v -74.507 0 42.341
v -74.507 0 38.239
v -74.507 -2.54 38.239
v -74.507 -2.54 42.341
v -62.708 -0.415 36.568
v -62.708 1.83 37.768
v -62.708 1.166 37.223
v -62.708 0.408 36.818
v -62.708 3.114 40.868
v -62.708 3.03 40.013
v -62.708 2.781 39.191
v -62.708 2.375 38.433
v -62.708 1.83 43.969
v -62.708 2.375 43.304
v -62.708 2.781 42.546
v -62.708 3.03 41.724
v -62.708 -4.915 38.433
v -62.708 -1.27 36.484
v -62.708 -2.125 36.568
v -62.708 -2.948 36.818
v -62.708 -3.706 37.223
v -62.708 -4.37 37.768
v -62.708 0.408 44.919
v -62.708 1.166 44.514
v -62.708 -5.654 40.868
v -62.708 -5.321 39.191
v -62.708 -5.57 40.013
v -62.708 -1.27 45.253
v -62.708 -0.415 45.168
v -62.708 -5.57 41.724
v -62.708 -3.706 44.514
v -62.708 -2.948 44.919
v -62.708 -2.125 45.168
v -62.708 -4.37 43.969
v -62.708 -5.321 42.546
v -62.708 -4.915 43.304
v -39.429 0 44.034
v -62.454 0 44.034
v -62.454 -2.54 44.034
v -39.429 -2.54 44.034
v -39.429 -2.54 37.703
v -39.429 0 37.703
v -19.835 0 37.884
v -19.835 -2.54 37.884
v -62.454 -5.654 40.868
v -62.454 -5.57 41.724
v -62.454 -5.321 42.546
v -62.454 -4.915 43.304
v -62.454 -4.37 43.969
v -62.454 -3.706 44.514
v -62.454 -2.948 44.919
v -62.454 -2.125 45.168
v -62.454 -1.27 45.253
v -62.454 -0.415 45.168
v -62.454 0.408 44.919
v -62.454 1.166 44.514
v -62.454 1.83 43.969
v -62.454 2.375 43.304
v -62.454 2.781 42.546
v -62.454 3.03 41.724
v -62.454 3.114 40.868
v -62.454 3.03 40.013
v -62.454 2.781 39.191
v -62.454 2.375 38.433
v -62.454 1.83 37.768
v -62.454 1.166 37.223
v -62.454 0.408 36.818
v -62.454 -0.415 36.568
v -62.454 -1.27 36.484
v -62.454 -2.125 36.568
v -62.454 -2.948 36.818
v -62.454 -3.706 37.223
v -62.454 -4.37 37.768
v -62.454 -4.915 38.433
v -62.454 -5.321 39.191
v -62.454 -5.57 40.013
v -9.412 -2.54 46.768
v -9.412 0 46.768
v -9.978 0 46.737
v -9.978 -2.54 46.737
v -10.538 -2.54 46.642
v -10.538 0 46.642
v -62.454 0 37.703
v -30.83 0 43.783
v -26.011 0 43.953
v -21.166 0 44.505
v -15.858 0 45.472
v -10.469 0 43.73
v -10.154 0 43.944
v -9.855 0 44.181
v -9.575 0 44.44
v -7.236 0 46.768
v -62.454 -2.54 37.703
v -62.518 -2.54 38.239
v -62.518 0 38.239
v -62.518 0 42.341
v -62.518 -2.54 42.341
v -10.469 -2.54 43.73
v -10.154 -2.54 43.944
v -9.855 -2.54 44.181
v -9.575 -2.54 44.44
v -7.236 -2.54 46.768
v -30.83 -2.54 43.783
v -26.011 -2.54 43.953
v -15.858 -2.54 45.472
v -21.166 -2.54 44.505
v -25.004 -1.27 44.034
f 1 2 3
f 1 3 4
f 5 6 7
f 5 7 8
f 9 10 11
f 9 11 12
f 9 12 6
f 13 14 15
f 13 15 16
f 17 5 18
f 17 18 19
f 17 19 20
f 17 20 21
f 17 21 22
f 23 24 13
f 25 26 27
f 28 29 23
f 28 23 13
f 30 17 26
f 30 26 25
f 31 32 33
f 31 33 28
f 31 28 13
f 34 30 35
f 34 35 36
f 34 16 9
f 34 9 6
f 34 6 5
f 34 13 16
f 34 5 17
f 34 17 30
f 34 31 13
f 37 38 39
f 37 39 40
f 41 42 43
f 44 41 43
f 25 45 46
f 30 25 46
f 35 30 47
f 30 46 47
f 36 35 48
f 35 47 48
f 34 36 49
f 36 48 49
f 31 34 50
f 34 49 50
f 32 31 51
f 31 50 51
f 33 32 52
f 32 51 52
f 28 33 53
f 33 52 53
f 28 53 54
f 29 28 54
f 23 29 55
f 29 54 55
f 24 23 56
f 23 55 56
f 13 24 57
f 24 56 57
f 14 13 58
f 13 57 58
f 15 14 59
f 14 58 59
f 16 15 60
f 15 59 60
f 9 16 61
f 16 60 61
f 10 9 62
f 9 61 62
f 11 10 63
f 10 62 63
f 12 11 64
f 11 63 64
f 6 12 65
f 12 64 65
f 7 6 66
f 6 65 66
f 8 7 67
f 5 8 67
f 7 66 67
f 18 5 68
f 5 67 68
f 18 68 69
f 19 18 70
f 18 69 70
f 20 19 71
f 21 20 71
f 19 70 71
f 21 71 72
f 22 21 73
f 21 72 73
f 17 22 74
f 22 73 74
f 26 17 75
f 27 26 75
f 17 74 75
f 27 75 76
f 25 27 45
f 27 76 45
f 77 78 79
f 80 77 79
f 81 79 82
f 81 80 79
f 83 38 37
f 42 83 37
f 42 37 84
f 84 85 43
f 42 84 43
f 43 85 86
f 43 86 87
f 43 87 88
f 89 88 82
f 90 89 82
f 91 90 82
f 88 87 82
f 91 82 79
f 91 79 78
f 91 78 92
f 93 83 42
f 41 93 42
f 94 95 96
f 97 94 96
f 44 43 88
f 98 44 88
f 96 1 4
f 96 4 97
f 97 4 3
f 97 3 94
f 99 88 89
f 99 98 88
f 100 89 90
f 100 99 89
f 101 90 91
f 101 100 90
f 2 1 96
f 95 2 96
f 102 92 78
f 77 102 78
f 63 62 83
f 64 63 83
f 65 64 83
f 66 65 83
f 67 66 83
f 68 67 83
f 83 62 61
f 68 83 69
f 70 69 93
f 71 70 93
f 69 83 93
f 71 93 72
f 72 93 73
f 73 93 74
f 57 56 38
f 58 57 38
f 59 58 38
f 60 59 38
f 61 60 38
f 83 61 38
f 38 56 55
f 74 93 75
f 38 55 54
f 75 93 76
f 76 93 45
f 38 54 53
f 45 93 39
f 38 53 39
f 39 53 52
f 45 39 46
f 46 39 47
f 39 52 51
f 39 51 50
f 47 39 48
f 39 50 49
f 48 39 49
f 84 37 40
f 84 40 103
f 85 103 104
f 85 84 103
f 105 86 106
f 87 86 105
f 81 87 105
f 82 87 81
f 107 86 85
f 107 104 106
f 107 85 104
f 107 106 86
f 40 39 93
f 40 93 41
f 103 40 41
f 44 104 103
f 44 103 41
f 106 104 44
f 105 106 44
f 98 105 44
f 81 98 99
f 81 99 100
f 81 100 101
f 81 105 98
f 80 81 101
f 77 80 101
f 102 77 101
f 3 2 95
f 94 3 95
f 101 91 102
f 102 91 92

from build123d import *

# Parameters (mm, degrees)
F0_W     = 23.0244621634
F0_H     = 6.331730634
F1_DEPTH = 2.54
F2_R     = 4.3842644701
F3_DEPTH = 0.254
F4_W     = 11.9889006019
F4_H     = 4.1013769805
F5_DEPTH = 2.54
F6_R     = 5.08
F7_R     = 5.08


with BuildPart() as f1:
    # F0 (on Front) → F1 (new body)
    with BuildSketch(Plane.XZ):
        with Locations((-50.9416200221, 40.8684182912)):
            Rectangle(F0_W, F0_H)
        with BuildLine():
            add(Edge.make_bspline(
                [(-39.4293889403, 44.0342836082), (-34.6353719511, 43.8159711563), (-24.9092032572, 43.3730558018), (-15.0047185596, 45.6259190389), (-9.9821425974, 46.768348664)],
                knots=[0, 0, 0, 0, 0.4928988114, 1, 1, 1, 1], degree=3))
            Line((-39.4293889403, 44.0342836082), (-39.4293889403, 37.7025529742))
            Line((-39.4293889403, 37.7025529742), (-19.8352001607, 37.883721292))
            Line((-19.8352001607, 37.883721292), (-9.9821425974, 44.0342836082))
            Line((-9.9821425974, 44.0342836082), (-7.2362092324, 46.768348664))
            Line((-7.2362092324, 46.768348664), (-9.9821425974, 46.768348664))
        make_face()
    extrude(amount=F1_DEPTH)

    # F2 (on face) → F3 (join)
    with BuildSketch(Plane(origin=(-62.4538511038, 0, 0), x_dir=(0, -1, 0), z_dir=(-1, 0, 0))):
        with Locations((1.27, 40.8684182912)):
            Circle(F2_R)
    extrude(amount=F3_DEPTH)

    # F6
    f6_edges = [f1.edges().sort_by_distance(p)[0] for p in [
        (-9.982143, -1.27, 44.034284),
    ]]
    fillet(f6_edges, radius=F6_R)

    # F7
    f7_edges = [f1.edges().sort_by_distance(p)[0] for p in [
        (-9.982143, -1.27, 46.768349),
    ]]
    fillet(f7_edges, radius=F7_R)


with BuildPart() as f5:
    # F4 (on Front) → F5 (new body)
    with BuildSketch(Plane.XZ):
        with Locations((-68.5129053891, 40.2898248285)):
            Rectangle(F4_W, F4_H)
    extrude(amount=F5_DEPTH)


solid = Compound([f1.part, f5.part])
